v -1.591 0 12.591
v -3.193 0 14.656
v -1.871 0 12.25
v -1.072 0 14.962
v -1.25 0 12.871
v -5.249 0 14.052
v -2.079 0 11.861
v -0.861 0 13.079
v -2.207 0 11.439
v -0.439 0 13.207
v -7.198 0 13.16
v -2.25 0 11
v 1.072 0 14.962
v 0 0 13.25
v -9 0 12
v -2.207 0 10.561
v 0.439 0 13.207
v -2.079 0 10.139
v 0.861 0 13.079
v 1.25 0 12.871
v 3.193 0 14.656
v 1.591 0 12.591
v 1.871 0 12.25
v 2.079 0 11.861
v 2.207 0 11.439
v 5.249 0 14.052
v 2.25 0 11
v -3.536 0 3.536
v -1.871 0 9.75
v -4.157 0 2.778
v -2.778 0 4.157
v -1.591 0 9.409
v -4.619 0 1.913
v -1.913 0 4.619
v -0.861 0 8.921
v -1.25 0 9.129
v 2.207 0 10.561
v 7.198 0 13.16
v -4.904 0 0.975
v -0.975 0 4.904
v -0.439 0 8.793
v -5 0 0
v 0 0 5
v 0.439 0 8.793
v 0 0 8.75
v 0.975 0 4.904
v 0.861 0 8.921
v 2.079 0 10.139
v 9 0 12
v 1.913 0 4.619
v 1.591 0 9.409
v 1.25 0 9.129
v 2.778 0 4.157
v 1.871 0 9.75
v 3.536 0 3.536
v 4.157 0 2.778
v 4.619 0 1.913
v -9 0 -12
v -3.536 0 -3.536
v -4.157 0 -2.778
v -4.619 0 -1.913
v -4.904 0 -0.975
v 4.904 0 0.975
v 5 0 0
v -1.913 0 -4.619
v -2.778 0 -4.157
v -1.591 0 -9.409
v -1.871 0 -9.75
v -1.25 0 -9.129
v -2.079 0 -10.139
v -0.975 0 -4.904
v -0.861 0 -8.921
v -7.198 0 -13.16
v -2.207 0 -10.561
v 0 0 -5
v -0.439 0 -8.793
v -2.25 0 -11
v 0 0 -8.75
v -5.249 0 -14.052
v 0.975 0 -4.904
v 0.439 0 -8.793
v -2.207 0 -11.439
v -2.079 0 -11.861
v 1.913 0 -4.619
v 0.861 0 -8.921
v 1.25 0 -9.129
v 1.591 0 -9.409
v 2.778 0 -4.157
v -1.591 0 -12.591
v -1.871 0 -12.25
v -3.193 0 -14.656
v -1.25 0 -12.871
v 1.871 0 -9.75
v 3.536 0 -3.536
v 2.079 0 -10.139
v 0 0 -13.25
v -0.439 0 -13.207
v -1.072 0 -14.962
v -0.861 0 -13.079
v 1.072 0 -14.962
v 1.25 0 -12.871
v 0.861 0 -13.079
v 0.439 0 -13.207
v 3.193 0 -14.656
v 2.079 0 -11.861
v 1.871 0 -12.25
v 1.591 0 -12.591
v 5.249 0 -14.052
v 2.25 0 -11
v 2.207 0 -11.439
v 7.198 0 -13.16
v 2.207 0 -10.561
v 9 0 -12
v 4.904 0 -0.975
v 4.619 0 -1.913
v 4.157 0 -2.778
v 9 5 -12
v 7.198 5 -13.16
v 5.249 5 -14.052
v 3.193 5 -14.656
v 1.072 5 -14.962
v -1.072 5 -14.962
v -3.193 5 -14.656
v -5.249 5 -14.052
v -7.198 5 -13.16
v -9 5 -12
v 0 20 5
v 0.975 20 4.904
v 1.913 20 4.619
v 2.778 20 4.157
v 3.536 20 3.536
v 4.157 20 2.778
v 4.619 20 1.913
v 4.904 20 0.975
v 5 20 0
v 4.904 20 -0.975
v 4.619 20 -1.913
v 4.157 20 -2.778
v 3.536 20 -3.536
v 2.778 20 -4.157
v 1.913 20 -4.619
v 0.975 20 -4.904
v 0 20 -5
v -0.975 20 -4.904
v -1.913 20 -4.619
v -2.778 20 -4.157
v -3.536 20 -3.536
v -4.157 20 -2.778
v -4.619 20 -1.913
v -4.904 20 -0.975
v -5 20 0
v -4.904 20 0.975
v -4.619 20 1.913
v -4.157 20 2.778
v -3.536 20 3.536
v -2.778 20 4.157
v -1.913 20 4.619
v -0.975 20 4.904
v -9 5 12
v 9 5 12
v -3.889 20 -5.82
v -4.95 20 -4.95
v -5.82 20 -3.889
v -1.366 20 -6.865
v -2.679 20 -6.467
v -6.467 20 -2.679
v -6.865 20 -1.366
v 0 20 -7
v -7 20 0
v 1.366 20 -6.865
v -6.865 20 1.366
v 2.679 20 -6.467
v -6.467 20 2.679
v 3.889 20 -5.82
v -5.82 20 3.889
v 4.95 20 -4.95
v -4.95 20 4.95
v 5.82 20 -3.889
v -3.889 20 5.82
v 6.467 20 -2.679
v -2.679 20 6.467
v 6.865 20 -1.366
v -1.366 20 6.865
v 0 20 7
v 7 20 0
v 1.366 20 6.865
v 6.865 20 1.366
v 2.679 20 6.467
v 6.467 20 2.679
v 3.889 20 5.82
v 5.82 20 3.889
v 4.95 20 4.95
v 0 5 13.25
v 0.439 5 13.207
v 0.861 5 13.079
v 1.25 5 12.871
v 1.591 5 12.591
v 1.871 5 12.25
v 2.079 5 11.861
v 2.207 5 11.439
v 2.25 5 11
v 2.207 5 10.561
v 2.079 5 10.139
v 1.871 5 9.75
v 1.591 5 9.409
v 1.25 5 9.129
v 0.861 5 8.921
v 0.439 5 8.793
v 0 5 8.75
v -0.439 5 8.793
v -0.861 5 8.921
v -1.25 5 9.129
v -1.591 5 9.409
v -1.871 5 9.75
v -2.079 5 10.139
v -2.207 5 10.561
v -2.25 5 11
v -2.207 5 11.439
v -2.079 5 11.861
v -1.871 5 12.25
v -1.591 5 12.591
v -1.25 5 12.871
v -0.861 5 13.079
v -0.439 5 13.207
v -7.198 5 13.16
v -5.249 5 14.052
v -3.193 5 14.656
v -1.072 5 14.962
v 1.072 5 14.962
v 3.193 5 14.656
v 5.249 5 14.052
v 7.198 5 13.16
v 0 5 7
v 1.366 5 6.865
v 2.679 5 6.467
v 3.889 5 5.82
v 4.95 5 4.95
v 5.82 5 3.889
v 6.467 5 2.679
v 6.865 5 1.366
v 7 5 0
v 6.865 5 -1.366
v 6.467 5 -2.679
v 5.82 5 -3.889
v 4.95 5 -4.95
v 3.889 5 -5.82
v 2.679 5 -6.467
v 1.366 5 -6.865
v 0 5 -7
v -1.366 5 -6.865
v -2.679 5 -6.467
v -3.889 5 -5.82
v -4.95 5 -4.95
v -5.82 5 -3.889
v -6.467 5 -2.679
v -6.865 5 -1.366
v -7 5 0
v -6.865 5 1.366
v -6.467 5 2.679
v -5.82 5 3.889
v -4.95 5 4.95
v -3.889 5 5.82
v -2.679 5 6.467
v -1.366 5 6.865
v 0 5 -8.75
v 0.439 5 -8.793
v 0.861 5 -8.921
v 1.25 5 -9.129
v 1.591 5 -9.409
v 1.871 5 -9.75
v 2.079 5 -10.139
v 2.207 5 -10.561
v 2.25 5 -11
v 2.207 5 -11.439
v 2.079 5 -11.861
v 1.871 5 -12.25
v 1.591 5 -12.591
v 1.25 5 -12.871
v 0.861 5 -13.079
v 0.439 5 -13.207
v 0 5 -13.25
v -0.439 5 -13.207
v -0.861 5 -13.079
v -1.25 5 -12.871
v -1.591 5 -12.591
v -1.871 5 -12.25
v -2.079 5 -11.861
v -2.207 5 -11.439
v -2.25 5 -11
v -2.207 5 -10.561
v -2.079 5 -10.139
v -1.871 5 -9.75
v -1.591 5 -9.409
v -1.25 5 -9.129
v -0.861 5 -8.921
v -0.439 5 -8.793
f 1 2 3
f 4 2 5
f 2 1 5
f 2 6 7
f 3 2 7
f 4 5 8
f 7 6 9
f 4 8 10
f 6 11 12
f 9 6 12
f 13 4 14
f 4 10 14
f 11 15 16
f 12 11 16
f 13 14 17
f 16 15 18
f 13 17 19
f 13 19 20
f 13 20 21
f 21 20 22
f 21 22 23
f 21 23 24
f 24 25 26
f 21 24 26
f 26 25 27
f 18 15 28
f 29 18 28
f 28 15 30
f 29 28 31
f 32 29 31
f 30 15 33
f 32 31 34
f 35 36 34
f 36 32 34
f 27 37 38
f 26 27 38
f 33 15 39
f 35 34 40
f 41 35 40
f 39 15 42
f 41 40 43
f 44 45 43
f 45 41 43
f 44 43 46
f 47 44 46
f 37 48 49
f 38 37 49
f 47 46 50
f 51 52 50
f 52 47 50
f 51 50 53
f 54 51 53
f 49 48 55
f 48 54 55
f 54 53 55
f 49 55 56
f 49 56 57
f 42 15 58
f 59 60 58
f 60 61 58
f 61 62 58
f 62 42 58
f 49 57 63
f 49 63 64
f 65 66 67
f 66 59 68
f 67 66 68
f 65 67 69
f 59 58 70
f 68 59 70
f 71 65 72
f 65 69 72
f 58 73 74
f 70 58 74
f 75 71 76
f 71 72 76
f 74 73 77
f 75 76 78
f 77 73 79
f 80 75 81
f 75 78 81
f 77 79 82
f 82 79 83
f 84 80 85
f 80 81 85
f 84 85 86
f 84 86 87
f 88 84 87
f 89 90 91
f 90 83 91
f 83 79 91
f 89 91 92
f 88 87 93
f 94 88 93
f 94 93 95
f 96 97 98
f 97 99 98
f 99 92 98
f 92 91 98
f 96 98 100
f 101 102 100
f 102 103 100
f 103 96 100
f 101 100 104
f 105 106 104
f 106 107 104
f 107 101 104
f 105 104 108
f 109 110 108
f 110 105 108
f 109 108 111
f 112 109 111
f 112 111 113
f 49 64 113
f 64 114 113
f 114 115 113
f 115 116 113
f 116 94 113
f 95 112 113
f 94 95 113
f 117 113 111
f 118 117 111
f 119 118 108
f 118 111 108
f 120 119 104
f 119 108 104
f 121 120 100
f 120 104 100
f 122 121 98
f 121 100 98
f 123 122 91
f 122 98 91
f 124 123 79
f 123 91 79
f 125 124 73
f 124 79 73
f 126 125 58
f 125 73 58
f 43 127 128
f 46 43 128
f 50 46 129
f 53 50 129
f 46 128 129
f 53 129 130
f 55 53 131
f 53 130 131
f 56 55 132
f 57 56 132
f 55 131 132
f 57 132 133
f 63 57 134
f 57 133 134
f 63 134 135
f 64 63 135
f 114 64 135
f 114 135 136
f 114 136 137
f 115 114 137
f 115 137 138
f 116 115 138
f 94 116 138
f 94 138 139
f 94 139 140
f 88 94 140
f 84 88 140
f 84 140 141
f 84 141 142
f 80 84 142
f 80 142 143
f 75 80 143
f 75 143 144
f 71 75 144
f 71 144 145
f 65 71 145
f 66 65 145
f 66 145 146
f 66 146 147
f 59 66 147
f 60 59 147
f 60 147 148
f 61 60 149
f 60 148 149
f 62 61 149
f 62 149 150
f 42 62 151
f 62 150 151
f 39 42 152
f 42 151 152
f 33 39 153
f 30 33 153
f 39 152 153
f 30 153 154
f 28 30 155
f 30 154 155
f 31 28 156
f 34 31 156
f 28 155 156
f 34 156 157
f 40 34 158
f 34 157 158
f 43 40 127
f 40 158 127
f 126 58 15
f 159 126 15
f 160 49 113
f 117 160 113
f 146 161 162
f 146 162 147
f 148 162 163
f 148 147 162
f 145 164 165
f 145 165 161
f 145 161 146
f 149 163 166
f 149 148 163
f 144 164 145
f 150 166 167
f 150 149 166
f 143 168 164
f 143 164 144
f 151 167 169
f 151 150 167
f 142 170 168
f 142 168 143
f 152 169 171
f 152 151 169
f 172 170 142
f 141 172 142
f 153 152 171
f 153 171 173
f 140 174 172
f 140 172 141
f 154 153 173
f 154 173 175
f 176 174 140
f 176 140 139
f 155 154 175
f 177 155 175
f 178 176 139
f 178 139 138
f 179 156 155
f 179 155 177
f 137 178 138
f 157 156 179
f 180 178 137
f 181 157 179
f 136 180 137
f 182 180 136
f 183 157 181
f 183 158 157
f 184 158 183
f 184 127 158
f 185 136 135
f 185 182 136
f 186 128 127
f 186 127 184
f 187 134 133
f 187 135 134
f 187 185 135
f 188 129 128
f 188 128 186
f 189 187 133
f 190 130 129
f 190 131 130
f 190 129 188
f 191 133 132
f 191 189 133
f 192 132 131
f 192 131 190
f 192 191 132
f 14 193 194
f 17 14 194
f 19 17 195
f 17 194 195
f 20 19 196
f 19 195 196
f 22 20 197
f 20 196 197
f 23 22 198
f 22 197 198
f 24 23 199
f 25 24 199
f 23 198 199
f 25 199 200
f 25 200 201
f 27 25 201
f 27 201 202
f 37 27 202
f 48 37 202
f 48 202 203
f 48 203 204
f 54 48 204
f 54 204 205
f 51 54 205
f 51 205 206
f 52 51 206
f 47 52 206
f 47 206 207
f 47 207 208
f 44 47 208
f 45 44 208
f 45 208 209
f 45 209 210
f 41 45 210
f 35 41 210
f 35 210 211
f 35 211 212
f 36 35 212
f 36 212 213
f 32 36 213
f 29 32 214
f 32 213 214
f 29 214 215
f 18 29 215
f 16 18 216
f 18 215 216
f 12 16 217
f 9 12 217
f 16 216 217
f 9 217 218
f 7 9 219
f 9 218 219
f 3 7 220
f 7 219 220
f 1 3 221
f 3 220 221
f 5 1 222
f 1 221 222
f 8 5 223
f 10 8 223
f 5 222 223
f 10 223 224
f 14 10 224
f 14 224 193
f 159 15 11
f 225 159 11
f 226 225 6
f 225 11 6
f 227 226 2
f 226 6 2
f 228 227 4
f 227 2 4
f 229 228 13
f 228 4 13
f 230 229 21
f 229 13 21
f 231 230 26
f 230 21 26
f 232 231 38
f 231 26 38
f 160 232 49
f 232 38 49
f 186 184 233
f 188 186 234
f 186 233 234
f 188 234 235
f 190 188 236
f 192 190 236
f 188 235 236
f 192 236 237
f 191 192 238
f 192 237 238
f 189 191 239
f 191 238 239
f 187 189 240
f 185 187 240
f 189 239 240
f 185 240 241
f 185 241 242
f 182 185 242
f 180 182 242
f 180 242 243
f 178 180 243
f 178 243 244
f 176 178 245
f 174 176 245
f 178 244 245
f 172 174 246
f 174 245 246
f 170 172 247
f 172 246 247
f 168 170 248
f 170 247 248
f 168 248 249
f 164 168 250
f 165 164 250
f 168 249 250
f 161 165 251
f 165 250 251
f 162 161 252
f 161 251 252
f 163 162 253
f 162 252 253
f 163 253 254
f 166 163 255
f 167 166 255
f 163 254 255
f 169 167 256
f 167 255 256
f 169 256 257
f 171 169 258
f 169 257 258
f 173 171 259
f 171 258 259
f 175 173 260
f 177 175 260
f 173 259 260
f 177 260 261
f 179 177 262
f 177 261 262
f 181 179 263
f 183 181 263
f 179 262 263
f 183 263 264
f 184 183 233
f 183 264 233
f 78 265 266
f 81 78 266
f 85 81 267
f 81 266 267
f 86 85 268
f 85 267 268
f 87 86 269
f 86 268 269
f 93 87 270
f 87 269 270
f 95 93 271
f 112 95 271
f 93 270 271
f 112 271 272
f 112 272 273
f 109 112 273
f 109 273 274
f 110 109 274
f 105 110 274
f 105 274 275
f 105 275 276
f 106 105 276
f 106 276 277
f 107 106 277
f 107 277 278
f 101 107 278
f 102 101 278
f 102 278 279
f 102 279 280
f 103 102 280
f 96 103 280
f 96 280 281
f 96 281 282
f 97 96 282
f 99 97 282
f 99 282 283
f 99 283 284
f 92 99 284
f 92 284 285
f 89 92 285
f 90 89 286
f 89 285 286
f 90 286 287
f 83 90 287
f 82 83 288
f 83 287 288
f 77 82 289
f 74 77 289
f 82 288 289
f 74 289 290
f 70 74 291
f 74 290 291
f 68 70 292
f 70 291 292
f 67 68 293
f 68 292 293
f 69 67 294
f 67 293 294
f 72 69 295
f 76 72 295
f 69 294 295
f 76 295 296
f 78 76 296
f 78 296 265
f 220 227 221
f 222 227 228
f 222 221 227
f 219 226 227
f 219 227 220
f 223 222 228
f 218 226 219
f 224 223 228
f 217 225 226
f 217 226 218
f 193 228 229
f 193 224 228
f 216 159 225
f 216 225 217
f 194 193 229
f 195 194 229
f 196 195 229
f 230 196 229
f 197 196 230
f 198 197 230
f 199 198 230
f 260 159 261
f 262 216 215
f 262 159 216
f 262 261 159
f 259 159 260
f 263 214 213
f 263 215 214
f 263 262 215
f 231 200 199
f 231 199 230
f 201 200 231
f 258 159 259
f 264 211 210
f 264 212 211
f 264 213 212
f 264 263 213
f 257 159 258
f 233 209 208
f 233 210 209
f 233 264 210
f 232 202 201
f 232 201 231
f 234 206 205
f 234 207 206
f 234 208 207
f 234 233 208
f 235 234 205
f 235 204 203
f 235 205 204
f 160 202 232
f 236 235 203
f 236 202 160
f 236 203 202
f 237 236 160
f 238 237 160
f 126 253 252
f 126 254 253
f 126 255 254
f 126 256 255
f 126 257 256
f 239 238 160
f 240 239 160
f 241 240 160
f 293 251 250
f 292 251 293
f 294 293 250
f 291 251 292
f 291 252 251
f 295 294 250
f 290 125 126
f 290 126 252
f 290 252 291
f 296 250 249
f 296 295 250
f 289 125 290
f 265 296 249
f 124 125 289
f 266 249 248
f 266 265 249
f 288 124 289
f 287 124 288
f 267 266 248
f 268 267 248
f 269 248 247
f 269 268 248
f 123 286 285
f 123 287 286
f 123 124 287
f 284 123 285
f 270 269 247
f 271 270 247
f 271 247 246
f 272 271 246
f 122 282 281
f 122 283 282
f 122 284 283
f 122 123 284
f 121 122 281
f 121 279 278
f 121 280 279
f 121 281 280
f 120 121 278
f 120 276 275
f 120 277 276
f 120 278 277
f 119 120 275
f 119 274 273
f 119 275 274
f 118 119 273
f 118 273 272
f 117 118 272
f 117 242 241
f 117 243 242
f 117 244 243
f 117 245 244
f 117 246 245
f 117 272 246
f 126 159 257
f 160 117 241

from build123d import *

# Parameters (mm, degrees)
BOSS_EXTRU_1_DEPTH      = 5
ESQUISSE2_R             = 7
BOSS_EXTRU_2_DEPTH      = 15
ESQUISSE3_R             = 5
ENL_V_MAT_EXTRU_1_DEPTH = 30
ESQUISSE4_R             = 2.25
ENL_V_MAT_EXTRU_2_DEPTH = 30


with BuildPart() as part:
    # Esquisse1 → Boss.-Extru.1 (new body)
    with BuildSketch(Plane(origin=(0, 0, 0), x_dir=(1, 0, 0), z_dir=(0, 1, 0))):
        with BuildLine():
            Line((-9, 12), (-9, -12))
            ThreePointArc((-9, -12), (0, -15), (9, -12))
            Line((9, -12), (9, 12))
            ThreePointArc((9, 12), (0, 15), (-9, 12))
        make_face()
    extrude(amount=BOSS_EXTRU_1_DEPTH)

    # Esquisse2 → Boss.-Extru.2 (add)
    with BuildSketch(Plane(origin=(0, 5, 0), x_dir=(1, 0, 0), z_dir=(0, 1, 0))):
        with Locations(Location((0, 0, 0), (0, 0, 270))):
            Circle(ESQUISSE2_R)
    extrude(amount=BOSS_EXTRU_2_DEPTH)

    # Esquisse3 → Enlèv. mat.-Extru.1 (cut)
    with BuildSketch(Plane(origin=(0, 20, 0), x_dir=(1, 0, 0), z_dir=(0, 1, 0))):
        with Locations(Location((0, 0, 0), (0, 0, 270))):
            Circle(ESQUISSE3_R)
    extrude(amount=-ENL_V_MAT_EXTRU_1_DEPTH, mode=Mode.SUBTRACT)

    # Esquisse4 → Enlèv. mat.-Extru.2 (cut)
    with BuildSketch(Plane(origin=(0, 5, 0), x_dir=(1, 0, 0), z_dir=(0, 1, 0))):
        with Locations(Location((0, 11, 0), (0, 0, 270))):
            Circle(ESQUISSE4_R)
        with Locations(Location((0, -11, 0), (0, 0, 270))):
            Circle(ESQUISSE4_R)
    extrude(amount=-ENL_V_MAT_EXTRU_2_DEPTH, mode=Mode.SUBTRACT)


solid = part.part
